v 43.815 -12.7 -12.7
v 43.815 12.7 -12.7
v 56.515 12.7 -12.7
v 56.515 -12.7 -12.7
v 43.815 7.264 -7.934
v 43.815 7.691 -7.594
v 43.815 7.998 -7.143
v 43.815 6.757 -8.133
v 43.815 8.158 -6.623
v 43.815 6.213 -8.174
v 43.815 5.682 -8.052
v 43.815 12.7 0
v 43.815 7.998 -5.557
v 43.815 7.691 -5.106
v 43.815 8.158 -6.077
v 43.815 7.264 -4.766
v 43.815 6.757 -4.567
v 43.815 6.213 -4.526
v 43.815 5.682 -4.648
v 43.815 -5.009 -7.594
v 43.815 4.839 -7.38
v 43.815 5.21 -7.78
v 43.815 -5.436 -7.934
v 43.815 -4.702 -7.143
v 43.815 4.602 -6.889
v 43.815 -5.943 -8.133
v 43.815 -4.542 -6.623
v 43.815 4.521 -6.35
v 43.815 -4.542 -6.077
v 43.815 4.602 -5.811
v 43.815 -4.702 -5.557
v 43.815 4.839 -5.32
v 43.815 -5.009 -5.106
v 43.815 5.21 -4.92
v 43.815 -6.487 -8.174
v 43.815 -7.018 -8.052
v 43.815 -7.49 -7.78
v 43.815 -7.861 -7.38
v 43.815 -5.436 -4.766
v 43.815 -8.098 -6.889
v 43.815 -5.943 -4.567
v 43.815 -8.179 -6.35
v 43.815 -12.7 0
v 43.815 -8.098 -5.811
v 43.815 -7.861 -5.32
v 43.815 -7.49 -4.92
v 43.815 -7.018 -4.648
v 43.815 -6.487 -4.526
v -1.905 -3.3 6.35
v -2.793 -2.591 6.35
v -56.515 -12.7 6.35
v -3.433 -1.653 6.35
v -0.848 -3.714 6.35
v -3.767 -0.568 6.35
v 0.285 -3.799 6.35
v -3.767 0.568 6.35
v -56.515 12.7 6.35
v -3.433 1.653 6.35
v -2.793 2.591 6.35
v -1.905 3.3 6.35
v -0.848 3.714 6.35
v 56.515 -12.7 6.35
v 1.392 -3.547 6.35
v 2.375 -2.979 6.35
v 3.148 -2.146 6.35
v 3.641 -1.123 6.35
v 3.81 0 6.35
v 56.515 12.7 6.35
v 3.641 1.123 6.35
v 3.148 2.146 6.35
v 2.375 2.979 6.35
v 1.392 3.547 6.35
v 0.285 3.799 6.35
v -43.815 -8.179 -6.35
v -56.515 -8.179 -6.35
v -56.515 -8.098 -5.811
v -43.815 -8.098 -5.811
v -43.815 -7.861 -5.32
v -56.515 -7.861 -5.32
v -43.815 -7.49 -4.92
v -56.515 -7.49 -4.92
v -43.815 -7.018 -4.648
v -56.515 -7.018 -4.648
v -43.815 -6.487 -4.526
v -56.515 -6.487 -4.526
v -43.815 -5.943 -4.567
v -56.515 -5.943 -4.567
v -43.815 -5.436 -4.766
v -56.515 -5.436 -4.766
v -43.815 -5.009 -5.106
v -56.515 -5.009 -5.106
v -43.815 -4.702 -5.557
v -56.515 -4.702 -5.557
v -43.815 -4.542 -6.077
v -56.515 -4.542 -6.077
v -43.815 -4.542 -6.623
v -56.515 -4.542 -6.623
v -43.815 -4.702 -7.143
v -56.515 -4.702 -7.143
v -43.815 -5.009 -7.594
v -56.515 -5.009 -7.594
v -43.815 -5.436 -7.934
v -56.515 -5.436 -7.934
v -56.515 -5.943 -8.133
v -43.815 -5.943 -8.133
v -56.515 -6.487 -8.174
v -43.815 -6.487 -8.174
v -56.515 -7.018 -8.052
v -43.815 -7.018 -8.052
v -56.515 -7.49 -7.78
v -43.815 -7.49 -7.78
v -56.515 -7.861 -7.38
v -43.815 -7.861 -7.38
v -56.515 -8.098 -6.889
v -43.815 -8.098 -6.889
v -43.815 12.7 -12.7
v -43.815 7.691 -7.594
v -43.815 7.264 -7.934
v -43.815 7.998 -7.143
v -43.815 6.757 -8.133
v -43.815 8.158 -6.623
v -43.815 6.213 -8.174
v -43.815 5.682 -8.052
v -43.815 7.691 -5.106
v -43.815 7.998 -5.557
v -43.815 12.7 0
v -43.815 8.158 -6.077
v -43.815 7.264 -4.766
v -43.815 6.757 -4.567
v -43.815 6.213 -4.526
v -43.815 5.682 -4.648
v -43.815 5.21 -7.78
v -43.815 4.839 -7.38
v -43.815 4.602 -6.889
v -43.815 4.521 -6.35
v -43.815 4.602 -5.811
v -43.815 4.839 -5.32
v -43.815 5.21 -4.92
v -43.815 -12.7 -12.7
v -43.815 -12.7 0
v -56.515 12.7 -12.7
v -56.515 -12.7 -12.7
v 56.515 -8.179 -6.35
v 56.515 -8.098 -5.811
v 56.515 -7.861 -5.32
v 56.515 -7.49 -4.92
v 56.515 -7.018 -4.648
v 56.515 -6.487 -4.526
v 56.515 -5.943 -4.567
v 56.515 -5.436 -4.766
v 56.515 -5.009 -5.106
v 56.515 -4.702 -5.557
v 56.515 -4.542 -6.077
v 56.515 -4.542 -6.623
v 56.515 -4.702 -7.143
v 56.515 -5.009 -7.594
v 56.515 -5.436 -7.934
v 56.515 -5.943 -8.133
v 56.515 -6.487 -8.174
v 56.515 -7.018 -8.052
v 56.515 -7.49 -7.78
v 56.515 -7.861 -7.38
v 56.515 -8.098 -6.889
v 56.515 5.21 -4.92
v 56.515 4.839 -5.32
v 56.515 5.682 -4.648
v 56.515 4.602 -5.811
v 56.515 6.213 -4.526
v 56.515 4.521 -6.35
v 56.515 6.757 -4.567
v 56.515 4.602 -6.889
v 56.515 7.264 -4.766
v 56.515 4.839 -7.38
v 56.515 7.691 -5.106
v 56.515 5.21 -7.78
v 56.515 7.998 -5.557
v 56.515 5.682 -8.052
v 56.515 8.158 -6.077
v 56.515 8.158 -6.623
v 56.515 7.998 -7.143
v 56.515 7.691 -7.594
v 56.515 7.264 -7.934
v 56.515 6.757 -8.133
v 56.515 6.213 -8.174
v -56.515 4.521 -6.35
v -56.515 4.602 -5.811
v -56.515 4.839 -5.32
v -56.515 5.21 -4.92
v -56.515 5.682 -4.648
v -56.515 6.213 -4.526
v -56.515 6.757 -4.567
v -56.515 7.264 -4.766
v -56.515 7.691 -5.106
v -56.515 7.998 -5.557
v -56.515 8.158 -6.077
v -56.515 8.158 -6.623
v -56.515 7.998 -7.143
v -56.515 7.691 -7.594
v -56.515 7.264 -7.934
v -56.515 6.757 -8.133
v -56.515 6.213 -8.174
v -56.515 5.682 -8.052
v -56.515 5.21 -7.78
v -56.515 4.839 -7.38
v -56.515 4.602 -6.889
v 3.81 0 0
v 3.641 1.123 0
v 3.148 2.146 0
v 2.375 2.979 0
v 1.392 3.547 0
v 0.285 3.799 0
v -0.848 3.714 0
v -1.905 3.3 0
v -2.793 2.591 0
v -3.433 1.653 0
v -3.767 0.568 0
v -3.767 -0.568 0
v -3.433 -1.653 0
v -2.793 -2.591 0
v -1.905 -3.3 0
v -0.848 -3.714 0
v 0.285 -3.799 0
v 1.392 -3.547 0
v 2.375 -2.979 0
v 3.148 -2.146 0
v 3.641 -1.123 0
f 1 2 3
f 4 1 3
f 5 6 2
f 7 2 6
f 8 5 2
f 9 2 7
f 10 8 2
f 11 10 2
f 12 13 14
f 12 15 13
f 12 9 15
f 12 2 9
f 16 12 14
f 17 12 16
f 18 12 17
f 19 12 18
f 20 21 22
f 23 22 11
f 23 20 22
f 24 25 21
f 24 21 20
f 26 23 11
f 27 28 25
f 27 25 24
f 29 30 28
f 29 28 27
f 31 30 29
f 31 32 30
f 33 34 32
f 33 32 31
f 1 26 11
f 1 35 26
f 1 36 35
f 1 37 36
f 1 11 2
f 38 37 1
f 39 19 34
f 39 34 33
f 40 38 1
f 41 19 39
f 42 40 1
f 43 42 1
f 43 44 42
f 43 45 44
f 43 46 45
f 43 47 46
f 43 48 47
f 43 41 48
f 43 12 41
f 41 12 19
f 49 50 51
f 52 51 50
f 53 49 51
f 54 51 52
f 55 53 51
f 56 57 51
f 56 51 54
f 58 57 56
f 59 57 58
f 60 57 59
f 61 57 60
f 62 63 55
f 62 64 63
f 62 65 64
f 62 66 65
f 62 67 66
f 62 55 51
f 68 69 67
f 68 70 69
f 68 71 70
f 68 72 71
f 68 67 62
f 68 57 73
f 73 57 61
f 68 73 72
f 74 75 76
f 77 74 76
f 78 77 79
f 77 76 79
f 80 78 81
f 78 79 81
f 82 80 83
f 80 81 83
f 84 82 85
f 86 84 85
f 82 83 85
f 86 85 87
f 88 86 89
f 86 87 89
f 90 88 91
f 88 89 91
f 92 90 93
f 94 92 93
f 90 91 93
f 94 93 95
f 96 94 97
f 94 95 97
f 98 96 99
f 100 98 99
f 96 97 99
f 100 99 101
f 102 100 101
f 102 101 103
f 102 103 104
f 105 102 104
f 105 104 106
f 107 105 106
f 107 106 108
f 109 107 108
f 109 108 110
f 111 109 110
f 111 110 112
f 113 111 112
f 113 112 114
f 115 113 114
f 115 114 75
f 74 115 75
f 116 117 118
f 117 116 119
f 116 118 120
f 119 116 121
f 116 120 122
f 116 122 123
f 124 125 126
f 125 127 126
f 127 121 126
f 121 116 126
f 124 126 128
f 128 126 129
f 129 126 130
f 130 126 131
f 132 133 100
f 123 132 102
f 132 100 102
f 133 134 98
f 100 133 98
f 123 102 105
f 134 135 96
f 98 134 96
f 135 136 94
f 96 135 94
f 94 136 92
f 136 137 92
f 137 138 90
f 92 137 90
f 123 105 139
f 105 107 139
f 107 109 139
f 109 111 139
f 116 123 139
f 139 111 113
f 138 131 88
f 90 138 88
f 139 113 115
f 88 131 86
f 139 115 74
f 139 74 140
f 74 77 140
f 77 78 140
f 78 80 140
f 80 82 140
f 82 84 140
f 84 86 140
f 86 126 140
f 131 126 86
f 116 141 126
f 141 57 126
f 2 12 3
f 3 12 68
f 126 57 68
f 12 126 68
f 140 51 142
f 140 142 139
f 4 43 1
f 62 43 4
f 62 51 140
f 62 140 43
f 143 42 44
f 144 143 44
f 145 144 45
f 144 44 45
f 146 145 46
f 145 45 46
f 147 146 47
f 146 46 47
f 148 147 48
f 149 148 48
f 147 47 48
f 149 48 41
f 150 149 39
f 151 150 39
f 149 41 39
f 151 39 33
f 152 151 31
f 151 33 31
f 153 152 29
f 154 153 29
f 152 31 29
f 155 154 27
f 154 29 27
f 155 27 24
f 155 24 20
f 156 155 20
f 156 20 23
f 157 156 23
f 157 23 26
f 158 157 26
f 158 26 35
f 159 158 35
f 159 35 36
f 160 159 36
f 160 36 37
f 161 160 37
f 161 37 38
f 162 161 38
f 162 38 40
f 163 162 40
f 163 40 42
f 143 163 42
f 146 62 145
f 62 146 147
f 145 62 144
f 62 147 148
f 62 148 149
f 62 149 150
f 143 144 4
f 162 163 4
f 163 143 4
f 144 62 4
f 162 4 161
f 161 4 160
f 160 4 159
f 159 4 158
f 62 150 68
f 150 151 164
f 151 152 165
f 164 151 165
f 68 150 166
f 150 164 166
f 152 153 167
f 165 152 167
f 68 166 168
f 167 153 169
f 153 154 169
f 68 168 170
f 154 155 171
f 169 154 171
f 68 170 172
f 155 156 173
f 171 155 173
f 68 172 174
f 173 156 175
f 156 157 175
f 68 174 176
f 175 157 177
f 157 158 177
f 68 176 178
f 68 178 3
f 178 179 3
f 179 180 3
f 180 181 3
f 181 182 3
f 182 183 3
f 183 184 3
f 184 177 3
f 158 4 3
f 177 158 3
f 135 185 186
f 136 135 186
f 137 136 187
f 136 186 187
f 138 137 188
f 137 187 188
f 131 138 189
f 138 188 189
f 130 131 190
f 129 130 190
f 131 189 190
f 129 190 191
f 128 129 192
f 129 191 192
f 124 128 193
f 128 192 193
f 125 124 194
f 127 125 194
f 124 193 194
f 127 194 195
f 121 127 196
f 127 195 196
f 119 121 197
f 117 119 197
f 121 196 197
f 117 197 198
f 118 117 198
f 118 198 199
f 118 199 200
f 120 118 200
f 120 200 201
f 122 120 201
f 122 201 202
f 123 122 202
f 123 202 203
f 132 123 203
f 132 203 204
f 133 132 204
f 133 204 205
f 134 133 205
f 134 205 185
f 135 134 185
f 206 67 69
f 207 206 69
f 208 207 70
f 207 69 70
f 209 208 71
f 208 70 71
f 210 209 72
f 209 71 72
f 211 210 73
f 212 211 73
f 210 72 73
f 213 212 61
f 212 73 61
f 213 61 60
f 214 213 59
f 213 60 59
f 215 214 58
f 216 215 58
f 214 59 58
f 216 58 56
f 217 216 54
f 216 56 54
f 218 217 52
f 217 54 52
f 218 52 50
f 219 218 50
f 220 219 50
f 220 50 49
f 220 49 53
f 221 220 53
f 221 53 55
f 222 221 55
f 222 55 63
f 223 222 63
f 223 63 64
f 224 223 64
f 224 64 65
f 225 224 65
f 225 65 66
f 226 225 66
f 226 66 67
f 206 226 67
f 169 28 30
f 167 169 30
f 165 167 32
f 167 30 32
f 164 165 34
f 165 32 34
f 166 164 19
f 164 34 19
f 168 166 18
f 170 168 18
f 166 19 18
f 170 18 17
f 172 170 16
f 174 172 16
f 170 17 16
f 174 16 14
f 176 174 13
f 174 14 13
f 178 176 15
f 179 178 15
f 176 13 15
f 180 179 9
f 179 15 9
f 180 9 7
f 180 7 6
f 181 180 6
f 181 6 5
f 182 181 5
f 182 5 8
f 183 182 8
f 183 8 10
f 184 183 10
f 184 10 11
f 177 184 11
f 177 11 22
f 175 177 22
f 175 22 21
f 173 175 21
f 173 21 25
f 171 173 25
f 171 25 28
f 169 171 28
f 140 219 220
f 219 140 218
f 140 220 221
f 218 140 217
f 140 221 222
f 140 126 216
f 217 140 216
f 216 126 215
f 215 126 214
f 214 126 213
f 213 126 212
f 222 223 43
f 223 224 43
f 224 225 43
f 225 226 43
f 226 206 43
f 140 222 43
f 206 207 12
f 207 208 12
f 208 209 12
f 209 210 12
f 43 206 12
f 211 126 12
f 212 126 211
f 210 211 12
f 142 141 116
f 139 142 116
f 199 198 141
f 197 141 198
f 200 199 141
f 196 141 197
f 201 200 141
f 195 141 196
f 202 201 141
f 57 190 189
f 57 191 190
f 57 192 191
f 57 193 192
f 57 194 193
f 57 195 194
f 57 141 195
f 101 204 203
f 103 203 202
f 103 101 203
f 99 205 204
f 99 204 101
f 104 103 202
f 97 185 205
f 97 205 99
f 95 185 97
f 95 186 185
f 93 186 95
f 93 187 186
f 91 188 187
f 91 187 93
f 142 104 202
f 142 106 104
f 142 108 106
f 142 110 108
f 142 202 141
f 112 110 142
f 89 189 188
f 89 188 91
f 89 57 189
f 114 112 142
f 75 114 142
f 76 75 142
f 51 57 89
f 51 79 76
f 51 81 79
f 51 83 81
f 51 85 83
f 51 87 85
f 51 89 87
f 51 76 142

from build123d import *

# Parameters (mm, degrees)
F0_W     = 113.03
F0_H     = 25.4
F1_DEPTH = 6.35
F2_R     = 3.81
F3_DEPTH = 6.351
F4_W     = 12.7
F4_H     = 25.4
F5_DEPTH = 12.7
F6_R     = 1.8288
F7_DEPTH = 254


with BuildPart() as f1:
    # F0 (on Top) → F1 (new body)
    with BuildSketch(Plane.XY):
        Rectangle(F0_W, F0_H)
    extrude(amount=F1_DEPTH)

    # F2 (on face) → F3 (cut, through all)
    with BuildSketch(Plane.XY.offset(6.35)):
        Circle(F2_R)
    extrude(amount=-F3_DEPTH, mode=Mode.SUBTRACT)

    # F4 (on face) → F5 (join)
    with BuildSketch(Plane(origin=(0, 0, 0), x_dir=(1, 0, 0), z_dir=(0, 0, -1))):
        with Locations((-50.165, 0)):
            Rectangle(F4_W, F4_H)
        with Locations((50.165, 0)):
            Rectangle(F4_W, F4_H)
    extrude(amount=F5_DEPTH)

    # F6 (on face) → F7 (cut)
    with BuildSketch(Plane(origin=(-56.515, 0, 0), x_dir=(0, -1, 0), z_dir=(-1, 0, 0))):
        with Locations((-6.35, -6.35)):
            Circle(F6_R)
        with Locations((6.35, -6.35)):
            Circle(F6_R)
    extrude(amount=-F7_DEPTH, mode=Mode.SUBTRACT)


solid = f1.part
